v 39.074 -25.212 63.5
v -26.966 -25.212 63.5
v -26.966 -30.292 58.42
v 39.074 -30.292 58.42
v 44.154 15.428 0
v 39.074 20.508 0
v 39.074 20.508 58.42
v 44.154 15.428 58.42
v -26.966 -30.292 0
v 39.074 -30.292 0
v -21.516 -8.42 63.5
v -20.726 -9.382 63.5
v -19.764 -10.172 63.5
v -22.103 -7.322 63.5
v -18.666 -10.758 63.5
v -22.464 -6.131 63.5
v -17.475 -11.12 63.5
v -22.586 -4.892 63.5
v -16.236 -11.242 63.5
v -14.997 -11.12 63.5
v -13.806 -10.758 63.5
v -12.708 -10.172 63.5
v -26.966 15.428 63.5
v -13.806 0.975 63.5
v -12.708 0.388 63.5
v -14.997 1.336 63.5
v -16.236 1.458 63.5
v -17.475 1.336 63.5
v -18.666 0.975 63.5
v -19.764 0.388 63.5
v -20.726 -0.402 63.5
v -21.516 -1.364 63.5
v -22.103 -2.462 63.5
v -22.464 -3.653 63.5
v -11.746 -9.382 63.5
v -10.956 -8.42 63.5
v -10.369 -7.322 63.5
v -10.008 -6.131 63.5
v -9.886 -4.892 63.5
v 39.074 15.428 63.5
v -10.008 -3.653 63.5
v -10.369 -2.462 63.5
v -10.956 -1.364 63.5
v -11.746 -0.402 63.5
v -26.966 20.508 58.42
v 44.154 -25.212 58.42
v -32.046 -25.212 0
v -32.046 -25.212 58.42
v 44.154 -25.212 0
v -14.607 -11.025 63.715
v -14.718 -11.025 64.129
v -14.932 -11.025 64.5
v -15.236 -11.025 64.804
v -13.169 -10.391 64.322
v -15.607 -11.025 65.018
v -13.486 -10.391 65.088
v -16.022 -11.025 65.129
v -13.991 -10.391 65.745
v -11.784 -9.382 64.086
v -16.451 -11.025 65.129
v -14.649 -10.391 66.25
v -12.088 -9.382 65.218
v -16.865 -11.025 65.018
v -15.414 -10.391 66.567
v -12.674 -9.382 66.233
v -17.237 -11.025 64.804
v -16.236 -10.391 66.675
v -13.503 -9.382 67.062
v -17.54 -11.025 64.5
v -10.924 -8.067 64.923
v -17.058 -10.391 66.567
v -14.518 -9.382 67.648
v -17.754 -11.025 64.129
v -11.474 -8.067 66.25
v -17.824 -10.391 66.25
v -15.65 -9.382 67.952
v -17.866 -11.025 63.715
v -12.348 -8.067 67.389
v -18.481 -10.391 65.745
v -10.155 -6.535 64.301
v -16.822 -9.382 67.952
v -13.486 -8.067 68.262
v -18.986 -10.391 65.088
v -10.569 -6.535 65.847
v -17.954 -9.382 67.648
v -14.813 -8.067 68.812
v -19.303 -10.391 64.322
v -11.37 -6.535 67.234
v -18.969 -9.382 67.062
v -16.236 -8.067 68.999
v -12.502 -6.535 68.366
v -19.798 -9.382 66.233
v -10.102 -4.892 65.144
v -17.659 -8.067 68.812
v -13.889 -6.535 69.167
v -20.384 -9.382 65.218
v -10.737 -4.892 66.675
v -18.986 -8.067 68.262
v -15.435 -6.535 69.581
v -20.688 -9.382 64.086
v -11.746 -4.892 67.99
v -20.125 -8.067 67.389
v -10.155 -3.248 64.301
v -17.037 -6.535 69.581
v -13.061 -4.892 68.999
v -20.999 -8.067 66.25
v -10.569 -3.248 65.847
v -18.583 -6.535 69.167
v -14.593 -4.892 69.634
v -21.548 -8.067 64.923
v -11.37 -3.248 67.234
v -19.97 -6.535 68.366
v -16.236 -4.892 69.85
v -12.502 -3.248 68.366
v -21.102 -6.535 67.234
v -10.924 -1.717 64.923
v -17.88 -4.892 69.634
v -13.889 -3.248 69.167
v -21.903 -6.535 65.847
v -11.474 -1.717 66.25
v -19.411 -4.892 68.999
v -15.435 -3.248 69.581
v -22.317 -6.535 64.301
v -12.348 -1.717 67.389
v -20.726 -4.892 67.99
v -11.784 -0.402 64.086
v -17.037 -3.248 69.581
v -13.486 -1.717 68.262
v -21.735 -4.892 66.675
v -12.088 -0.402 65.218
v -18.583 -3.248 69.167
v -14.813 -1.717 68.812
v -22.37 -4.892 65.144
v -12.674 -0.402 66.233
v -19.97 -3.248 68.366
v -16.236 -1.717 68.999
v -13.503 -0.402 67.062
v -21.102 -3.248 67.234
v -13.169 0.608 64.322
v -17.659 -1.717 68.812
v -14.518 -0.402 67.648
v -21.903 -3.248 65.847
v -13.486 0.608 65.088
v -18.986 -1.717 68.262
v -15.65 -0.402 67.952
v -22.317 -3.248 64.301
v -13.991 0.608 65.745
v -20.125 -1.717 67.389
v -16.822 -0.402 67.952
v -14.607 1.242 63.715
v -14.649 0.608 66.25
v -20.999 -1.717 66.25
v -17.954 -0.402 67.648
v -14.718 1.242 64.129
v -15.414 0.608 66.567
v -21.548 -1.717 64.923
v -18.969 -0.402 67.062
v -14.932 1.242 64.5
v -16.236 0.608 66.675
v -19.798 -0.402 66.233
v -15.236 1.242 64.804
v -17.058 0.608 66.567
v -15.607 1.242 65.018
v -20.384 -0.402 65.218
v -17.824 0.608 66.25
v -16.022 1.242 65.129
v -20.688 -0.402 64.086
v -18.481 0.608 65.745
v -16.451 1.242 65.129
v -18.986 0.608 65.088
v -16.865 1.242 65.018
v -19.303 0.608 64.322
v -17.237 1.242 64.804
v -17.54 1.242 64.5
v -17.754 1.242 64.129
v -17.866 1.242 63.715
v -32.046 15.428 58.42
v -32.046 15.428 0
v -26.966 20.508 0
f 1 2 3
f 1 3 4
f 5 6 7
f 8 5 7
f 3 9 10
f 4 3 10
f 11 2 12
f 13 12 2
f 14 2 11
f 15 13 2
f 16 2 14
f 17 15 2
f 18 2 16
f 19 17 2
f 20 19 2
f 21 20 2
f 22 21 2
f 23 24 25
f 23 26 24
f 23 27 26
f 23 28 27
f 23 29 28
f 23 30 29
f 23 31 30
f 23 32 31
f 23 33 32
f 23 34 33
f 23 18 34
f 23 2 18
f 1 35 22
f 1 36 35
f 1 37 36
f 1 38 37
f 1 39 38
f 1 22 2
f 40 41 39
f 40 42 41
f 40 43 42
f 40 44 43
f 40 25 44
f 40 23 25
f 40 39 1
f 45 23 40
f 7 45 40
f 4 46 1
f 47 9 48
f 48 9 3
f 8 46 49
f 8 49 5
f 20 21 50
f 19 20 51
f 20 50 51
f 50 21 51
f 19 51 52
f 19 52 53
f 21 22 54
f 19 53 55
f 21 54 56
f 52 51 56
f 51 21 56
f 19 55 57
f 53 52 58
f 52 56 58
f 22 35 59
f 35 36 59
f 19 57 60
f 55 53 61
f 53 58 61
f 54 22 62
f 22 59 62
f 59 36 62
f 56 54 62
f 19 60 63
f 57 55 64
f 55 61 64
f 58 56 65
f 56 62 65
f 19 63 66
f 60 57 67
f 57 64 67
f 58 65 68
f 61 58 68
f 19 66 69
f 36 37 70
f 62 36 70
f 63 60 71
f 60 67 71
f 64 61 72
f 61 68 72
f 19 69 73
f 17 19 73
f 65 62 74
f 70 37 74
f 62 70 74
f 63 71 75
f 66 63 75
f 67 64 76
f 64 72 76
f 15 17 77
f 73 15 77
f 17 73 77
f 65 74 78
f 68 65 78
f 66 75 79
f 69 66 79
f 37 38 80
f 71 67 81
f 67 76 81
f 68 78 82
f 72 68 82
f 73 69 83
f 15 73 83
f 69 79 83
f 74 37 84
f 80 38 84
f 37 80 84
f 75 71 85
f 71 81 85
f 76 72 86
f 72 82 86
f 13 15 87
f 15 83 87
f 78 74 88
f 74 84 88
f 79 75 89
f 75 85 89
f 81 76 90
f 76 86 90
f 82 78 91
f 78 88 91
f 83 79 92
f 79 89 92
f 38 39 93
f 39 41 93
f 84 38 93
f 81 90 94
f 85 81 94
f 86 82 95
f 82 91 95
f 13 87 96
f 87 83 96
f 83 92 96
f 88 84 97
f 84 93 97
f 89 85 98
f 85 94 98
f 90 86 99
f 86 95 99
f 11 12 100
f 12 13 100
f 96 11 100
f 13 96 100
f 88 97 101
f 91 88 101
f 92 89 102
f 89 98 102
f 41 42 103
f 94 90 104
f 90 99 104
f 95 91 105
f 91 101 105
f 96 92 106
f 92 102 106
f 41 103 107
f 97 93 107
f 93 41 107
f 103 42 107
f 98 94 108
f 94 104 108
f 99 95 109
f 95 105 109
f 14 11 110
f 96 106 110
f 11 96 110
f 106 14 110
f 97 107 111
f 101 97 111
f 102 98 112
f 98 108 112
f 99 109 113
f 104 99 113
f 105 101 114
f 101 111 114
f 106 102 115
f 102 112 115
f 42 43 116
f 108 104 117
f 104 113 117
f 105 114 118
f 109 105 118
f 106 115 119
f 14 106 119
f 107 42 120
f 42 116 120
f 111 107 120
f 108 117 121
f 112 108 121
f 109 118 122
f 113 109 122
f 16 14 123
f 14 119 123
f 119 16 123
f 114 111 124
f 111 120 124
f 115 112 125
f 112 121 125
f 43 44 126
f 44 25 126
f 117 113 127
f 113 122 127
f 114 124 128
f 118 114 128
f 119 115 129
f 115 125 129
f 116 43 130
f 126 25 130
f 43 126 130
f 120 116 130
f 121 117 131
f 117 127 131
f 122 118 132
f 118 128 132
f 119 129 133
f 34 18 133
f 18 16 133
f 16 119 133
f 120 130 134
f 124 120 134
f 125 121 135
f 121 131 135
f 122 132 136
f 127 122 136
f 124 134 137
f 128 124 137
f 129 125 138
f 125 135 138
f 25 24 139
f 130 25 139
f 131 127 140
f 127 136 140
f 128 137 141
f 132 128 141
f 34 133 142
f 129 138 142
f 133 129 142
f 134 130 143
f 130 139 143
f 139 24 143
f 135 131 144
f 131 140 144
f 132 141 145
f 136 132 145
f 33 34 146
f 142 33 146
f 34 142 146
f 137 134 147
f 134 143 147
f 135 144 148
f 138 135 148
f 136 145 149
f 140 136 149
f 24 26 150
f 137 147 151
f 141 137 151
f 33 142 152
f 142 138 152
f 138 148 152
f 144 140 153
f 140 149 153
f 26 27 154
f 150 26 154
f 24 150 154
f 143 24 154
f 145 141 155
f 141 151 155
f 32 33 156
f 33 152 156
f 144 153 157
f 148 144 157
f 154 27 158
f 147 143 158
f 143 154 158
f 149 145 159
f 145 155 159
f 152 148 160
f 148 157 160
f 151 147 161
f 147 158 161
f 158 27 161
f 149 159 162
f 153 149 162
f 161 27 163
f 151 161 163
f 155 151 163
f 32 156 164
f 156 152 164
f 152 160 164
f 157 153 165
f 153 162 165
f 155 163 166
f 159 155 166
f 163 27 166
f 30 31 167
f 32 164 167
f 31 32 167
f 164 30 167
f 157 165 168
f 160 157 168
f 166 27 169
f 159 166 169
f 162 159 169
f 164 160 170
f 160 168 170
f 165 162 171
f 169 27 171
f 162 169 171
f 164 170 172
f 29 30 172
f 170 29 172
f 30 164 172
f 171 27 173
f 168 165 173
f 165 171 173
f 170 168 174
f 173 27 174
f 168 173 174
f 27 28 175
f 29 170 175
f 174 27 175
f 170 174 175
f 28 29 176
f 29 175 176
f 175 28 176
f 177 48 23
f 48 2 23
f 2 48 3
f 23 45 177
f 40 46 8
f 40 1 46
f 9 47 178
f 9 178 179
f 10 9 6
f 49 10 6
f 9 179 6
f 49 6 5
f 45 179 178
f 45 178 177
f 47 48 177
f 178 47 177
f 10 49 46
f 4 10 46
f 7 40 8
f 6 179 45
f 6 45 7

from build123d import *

# Parameters (mm, degrees)
F0_W     = 76.2
F0_H     = 50.8
F1_DEPTH = 63.5
F2_SIZE  = 5.08


with BuildPart() as f1:
    # F0 (on Top) → F1 (new body)
    with BuildSketch(Plane.XY):
        with Locations((6.05372, -4.891751)):
            Rectangle(F0_W, F0_H)
    extrude(amount=F1_DEPTH)

    # F2
    f2_edges = [f1.edges().sort_by_distance(p)[0] for p in [
        (-32.04628, 20.508249, 31.75),
        (6.05372, 20.508249, 63.5),
        (-32.04628, -4.891751, 63.5),
        (-32.04628, -30.291751, 31.75),
        (44.15372, -4.891751, 63.5),
        (44.15372, 20.508249, 31.75),
        (44.15372, -30.291751, 31.75),
        (6.05372, -30.291751, 63.5),
    ]]
    chamfer(f2_edges, length=F2_SIZE)

    # F3 (on face) → F4 (revolve)
    with BuildSketch(Plane.XY.offset(63.5)):
        with BuildLine():
            Line((-16.236074, -4.891751), (-16.236074, -11.241751))
            ThreePointArc((-16.236074, -11.241751), (-9.886074, -4.891751), (-16.236074, 1.458249))
            Line((-16.236074, 1.458249), (-16.236074, -4.891751))
        make_face()
    revolve(axis=Axis((-16.236074, -4.891751, 63.5), (0, -1, 0)))


solid = f1.part
